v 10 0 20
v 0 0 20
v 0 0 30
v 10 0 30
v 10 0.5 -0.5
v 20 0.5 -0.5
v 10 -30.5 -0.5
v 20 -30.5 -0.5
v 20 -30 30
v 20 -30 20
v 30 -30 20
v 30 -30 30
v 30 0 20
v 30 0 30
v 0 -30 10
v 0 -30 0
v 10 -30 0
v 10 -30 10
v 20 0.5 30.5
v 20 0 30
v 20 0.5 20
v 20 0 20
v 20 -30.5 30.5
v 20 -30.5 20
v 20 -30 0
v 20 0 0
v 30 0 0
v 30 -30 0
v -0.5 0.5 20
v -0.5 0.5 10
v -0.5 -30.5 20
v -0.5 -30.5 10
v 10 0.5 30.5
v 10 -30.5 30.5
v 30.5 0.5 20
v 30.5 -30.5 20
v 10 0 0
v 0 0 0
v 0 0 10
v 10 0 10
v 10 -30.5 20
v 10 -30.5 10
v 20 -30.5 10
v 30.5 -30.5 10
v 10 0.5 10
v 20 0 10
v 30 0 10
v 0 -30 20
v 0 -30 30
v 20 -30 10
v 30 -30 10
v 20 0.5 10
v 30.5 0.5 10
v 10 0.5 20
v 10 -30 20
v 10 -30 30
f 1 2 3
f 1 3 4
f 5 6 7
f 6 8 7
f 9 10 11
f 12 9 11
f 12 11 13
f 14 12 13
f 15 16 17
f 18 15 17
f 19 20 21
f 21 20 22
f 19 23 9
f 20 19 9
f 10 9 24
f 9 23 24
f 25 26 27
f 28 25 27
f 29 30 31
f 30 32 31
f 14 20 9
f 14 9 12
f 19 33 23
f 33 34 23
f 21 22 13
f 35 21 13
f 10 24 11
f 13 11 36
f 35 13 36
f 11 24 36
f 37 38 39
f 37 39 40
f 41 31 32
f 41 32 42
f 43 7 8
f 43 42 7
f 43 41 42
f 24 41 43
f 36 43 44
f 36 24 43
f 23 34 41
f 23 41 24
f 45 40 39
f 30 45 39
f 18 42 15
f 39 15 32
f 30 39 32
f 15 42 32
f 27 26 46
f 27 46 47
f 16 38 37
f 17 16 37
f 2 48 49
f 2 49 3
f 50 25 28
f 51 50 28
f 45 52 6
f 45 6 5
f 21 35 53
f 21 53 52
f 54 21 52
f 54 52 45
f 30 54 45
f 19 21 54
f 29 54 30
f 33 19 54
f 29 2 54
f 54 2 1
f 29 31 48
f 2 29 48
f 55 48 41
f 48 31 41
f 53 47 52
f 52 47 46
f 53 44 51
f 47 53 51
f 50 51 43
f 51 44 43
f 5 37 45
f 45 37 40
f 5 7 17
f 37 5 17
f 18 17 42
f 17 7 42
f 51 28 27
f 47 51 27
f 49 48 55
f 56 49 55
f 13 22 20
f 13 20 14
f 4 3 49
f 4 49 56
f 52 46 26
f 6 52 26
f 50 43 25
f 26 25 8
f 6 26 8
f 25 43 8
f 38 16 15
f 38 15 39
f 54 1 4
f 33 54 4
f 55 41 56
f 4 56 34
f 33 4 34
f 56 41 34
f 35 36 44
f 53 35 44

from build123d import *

# Parameters (mm, degrees)
F0_W      = 30
F0_H      = 30
F1_DEPTH  = 30
F2_W      = 10
F2_H      = 30
F3_DEPTH  = 0.5
F4_W      = 30
F4_H      = 10
F5_DEPTH  = 0.5
F6_W      = 30
F6_H      = 10
F7_DEPTH  = 0.5
F8_W      = 10
F8_H      = 30
F9_DEPTH  = 0.5
F11_DEPTH = 0.5
F13_DEPTH = 0.5


with BuildPart() as f1:
    # F0 (on Top) → F1 (new body)
    with BuildSketch(Plane.XY):
        with Locations((15, -15)):
            Rectangle(F0_W, F0_H)
    extrude(amount=F1_DEPTH)

    # F2 (on face) → F3 (join)
    with BuildSketch(Plane.XY.offset(30)):
        with Locations((15, -15)):
            Rectangle(F2_W, F2_H)
    extrude(amount=F3_DEPTH)

    # F4 (on face) → F5 (join)
    with BuildSketch(Plane(origin=(0, 0, 0), x_dir=(0, -1, 0), z_dir=(-1, 0, 0))):
        with Locations((15, 15)):
            Rectangle(F4_W, F4_H)
    extrude(amount=F5_DEPTH)

    # F6 (on face) → F7 (join)
    with BuildSketch(Plane.YZ.offset(30)):
        with Locations((-15, 15)):
            Rectangle(F6_W, F6_H)
    extrude(amount=F7_DEPTH)

    # F8 (on face) → F9 (join)
    with BuildSketch(Plane(origin=(0, 0, 0), x_dir=(1, 0, 0), z_dir=(0, 0, -1))):
        with Locations((15, 15)):
            Rectangle(F8_W, F8_H)
    extrude(amount=F9_DEPTH)

    # F10 (on face) → F11 (join)
    with BuildSketch(Plane.XZ.offset(30)):
        Polygon((10, -0.5), (20, -0.5), (20, 0), (20, 10), (30, 10), (30.5, 10), (30.5, 20), (30, 20), (20, 20), (20, 30), (20, 30.5), (10, 30.5), (10, 30), (10, 20), (0, 20), (-0.5, 20), (-0.5, 10), (0, 10), (10, 10), (10, 0), align=None)
    extrude(amount=F11_DEPTH)

    # F12 (on face) → F13 (join)
    with BuildSketch(Plane(origin=(0, 0, 0), x_dir=(-1, 0, 0), z_dir=(0, 1, 0))):
        Polygon((-20, 10), (-20, -0.5), (-10, -0.5), (-10, 10), (0.5, 10), (0.5, 20), (-10, 20), (-10, 30.5), (-20, 30.5), (-20, 20), (-30.5, 20), (-30.5, 10), align=None)
    extrude(amount=F13_DEPTH)


solid = f1.part
